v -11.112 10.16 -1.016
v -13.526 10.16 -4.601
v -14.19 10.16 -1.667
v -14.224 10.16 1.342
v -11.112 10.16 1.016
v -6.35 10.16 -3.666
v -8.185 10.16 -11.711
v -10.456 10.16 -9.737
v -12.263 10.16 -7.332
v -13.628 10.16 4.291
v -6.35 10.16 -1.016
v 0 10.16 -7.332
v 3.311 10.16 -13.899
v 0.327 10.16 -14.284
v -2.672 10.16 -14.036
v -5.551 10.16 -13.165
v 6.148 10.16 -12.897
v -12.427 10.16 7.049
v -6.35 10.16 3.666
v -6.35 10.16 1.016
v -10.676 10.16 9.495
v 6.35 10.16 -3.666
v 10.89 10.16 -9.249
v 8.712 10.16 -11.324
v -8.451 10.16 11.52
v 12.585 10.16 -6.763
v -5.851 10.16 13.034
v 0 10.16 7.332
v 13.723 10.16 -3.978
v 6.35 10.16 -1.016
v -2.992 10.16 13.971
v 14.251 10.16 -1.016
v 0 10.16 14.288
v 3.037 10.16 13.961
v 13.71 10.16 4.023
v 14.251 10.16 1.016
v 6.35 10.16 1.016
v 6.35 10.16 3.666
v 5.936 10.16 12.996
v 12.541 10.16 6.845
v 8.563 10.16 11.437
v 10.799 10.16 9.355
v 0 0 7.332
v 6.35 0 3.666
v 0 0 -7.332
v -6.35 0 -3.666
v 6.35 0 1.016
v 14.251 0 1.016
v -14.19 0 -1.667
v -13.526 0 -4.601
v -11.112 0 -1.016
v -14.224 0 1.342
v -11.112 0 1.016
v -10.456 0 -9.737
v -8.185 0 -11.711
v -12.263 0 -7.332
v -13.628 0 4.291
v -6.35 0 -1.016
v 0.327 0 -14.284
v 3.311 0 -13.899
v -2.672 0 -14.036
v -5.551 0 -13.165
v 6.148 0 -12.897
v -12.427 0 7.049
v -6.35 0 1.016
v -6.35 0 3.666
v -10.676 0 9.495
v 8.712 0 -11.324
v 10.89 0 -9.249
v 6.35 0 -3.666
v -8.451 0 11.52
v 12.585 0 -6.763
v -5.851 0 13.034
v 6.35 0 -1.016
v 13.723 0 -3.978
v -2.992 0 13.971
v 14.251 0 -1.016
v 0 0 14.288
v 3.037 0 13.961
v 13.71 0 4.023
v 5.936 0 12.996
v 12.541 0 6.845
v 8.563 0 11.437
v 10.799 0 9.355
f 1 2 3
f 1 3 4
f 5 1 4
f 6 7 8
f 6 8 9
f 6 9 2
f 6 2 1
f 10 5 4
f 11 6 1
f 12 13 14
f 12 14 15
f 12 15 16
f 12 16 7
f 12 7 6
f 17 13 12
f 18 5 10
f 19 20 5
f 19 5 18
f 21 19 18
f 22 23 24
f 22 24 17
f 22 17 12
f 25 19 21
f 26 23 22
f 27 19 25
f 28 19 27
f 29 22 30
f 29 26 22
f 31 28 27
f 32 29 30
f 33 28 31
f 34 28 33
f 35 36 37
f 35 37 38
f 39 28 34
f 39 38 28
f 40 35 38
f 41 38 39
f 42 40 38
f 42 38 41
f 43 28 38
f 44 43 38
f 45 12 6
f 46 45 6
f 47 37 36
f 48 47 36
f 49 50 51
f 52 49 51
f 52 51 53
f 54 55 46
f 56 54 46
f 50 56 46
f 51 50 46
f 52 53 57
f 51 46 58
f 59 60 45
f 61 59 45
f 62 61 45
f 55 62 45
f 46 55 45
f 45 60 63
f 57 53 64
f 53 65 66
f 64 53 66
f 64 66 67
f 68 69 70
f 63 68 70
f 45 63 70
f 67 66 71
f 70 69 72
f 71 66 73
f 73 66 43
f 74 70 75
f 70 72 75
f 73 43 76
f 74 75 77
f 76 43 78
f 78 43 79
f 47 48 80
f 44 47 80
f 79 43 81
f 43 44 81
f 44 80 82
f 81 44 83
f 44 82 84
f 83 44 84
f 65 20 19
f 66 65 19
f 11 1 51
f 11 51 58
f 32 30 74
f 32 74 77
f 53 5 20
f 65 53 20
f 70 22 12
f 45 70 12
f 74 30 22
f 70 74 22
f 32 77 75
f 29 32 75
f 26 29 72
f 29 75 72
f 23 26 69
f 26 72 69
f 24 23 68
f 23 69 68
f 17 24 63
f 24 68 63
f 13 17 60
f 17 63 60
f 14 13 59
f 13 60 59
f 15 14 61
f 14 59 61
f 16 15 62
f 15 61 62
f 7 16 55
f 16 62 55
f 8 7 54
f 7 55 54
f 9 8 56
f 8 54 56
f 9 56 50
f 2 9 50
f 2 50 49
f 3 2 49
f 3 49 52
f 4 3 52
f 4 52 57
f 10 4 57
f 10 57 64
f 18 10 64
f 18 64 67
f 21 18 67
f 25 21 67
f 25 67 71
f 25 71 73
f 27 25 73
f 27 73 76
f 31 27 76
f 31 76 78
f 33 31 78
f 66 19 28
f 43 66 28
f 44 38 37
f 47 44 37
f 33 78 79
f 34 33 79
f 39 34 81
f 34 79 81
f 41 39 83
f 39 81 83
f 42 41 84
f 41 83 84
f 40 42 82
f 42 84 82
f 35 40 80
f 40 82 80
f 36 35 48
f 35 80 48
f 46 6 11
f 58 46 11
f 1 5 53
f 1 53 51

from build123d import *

# Parameters (mm, degrees)
SKETCH1_R           = 14.2875
BOSS_EXTRUDE1_DEPTH = 10.16
CUT_EXTRUDE1_DEPTH  = 23.61616485
SKETCH3_W           = 25.4
SKETCH3_H           = 2.032
CUT_EXTRUDE2_DEPTH  = 23.61616485


with BuildPart() as part:
    # Sketch1 → Boss-Extrude1 (new body)
    with BuildSketch(Plane(origin=(0, 0, 0), x_dir=(1, 0, 0), z_dir=(0, 1, 0))):
        with Locations(Location((0, 0, 0), (0, 0, 270))):
            Circle(SKETCH1_R)
    extrude(amount=BOSS_EXTRUDE1_DEPTH)

    # Sketch2 → Cut-Extrude1 (cut, through all)
    with BuildSketch(Plane(origin=(0, 10.16, 0), x_dir=(1, 0, 0), z_dir=(0, 1, 0))):
        Polygon((0, 7.332348419), (-6.35, 3.666174209), (-6.35, -3.666174209), (0, -7.332348419), (6.35, -3.666174209), (6.35, 3.666174209), align=None)
    extrude(amount=-CUT_EXTRUDE1_DEPTH, mode=Mode.SUBTRACT)

    # Sketch3 → Cut-Extrude2 (cut, through all)
    with BuildSketch(Plane(origin=(0, 10.16, 0), x_dir=(1, 0, 0), z_dir=(0, 1, 0))):
        with Locations((1.5875, 0)):
            Rectangle(SKETCH3_W, SKETCH3_H)
    extrude(amount=-CUT_EXTRUDE2_DEPTH, mode=Mode.SUBTRACT)


solid = part.part
